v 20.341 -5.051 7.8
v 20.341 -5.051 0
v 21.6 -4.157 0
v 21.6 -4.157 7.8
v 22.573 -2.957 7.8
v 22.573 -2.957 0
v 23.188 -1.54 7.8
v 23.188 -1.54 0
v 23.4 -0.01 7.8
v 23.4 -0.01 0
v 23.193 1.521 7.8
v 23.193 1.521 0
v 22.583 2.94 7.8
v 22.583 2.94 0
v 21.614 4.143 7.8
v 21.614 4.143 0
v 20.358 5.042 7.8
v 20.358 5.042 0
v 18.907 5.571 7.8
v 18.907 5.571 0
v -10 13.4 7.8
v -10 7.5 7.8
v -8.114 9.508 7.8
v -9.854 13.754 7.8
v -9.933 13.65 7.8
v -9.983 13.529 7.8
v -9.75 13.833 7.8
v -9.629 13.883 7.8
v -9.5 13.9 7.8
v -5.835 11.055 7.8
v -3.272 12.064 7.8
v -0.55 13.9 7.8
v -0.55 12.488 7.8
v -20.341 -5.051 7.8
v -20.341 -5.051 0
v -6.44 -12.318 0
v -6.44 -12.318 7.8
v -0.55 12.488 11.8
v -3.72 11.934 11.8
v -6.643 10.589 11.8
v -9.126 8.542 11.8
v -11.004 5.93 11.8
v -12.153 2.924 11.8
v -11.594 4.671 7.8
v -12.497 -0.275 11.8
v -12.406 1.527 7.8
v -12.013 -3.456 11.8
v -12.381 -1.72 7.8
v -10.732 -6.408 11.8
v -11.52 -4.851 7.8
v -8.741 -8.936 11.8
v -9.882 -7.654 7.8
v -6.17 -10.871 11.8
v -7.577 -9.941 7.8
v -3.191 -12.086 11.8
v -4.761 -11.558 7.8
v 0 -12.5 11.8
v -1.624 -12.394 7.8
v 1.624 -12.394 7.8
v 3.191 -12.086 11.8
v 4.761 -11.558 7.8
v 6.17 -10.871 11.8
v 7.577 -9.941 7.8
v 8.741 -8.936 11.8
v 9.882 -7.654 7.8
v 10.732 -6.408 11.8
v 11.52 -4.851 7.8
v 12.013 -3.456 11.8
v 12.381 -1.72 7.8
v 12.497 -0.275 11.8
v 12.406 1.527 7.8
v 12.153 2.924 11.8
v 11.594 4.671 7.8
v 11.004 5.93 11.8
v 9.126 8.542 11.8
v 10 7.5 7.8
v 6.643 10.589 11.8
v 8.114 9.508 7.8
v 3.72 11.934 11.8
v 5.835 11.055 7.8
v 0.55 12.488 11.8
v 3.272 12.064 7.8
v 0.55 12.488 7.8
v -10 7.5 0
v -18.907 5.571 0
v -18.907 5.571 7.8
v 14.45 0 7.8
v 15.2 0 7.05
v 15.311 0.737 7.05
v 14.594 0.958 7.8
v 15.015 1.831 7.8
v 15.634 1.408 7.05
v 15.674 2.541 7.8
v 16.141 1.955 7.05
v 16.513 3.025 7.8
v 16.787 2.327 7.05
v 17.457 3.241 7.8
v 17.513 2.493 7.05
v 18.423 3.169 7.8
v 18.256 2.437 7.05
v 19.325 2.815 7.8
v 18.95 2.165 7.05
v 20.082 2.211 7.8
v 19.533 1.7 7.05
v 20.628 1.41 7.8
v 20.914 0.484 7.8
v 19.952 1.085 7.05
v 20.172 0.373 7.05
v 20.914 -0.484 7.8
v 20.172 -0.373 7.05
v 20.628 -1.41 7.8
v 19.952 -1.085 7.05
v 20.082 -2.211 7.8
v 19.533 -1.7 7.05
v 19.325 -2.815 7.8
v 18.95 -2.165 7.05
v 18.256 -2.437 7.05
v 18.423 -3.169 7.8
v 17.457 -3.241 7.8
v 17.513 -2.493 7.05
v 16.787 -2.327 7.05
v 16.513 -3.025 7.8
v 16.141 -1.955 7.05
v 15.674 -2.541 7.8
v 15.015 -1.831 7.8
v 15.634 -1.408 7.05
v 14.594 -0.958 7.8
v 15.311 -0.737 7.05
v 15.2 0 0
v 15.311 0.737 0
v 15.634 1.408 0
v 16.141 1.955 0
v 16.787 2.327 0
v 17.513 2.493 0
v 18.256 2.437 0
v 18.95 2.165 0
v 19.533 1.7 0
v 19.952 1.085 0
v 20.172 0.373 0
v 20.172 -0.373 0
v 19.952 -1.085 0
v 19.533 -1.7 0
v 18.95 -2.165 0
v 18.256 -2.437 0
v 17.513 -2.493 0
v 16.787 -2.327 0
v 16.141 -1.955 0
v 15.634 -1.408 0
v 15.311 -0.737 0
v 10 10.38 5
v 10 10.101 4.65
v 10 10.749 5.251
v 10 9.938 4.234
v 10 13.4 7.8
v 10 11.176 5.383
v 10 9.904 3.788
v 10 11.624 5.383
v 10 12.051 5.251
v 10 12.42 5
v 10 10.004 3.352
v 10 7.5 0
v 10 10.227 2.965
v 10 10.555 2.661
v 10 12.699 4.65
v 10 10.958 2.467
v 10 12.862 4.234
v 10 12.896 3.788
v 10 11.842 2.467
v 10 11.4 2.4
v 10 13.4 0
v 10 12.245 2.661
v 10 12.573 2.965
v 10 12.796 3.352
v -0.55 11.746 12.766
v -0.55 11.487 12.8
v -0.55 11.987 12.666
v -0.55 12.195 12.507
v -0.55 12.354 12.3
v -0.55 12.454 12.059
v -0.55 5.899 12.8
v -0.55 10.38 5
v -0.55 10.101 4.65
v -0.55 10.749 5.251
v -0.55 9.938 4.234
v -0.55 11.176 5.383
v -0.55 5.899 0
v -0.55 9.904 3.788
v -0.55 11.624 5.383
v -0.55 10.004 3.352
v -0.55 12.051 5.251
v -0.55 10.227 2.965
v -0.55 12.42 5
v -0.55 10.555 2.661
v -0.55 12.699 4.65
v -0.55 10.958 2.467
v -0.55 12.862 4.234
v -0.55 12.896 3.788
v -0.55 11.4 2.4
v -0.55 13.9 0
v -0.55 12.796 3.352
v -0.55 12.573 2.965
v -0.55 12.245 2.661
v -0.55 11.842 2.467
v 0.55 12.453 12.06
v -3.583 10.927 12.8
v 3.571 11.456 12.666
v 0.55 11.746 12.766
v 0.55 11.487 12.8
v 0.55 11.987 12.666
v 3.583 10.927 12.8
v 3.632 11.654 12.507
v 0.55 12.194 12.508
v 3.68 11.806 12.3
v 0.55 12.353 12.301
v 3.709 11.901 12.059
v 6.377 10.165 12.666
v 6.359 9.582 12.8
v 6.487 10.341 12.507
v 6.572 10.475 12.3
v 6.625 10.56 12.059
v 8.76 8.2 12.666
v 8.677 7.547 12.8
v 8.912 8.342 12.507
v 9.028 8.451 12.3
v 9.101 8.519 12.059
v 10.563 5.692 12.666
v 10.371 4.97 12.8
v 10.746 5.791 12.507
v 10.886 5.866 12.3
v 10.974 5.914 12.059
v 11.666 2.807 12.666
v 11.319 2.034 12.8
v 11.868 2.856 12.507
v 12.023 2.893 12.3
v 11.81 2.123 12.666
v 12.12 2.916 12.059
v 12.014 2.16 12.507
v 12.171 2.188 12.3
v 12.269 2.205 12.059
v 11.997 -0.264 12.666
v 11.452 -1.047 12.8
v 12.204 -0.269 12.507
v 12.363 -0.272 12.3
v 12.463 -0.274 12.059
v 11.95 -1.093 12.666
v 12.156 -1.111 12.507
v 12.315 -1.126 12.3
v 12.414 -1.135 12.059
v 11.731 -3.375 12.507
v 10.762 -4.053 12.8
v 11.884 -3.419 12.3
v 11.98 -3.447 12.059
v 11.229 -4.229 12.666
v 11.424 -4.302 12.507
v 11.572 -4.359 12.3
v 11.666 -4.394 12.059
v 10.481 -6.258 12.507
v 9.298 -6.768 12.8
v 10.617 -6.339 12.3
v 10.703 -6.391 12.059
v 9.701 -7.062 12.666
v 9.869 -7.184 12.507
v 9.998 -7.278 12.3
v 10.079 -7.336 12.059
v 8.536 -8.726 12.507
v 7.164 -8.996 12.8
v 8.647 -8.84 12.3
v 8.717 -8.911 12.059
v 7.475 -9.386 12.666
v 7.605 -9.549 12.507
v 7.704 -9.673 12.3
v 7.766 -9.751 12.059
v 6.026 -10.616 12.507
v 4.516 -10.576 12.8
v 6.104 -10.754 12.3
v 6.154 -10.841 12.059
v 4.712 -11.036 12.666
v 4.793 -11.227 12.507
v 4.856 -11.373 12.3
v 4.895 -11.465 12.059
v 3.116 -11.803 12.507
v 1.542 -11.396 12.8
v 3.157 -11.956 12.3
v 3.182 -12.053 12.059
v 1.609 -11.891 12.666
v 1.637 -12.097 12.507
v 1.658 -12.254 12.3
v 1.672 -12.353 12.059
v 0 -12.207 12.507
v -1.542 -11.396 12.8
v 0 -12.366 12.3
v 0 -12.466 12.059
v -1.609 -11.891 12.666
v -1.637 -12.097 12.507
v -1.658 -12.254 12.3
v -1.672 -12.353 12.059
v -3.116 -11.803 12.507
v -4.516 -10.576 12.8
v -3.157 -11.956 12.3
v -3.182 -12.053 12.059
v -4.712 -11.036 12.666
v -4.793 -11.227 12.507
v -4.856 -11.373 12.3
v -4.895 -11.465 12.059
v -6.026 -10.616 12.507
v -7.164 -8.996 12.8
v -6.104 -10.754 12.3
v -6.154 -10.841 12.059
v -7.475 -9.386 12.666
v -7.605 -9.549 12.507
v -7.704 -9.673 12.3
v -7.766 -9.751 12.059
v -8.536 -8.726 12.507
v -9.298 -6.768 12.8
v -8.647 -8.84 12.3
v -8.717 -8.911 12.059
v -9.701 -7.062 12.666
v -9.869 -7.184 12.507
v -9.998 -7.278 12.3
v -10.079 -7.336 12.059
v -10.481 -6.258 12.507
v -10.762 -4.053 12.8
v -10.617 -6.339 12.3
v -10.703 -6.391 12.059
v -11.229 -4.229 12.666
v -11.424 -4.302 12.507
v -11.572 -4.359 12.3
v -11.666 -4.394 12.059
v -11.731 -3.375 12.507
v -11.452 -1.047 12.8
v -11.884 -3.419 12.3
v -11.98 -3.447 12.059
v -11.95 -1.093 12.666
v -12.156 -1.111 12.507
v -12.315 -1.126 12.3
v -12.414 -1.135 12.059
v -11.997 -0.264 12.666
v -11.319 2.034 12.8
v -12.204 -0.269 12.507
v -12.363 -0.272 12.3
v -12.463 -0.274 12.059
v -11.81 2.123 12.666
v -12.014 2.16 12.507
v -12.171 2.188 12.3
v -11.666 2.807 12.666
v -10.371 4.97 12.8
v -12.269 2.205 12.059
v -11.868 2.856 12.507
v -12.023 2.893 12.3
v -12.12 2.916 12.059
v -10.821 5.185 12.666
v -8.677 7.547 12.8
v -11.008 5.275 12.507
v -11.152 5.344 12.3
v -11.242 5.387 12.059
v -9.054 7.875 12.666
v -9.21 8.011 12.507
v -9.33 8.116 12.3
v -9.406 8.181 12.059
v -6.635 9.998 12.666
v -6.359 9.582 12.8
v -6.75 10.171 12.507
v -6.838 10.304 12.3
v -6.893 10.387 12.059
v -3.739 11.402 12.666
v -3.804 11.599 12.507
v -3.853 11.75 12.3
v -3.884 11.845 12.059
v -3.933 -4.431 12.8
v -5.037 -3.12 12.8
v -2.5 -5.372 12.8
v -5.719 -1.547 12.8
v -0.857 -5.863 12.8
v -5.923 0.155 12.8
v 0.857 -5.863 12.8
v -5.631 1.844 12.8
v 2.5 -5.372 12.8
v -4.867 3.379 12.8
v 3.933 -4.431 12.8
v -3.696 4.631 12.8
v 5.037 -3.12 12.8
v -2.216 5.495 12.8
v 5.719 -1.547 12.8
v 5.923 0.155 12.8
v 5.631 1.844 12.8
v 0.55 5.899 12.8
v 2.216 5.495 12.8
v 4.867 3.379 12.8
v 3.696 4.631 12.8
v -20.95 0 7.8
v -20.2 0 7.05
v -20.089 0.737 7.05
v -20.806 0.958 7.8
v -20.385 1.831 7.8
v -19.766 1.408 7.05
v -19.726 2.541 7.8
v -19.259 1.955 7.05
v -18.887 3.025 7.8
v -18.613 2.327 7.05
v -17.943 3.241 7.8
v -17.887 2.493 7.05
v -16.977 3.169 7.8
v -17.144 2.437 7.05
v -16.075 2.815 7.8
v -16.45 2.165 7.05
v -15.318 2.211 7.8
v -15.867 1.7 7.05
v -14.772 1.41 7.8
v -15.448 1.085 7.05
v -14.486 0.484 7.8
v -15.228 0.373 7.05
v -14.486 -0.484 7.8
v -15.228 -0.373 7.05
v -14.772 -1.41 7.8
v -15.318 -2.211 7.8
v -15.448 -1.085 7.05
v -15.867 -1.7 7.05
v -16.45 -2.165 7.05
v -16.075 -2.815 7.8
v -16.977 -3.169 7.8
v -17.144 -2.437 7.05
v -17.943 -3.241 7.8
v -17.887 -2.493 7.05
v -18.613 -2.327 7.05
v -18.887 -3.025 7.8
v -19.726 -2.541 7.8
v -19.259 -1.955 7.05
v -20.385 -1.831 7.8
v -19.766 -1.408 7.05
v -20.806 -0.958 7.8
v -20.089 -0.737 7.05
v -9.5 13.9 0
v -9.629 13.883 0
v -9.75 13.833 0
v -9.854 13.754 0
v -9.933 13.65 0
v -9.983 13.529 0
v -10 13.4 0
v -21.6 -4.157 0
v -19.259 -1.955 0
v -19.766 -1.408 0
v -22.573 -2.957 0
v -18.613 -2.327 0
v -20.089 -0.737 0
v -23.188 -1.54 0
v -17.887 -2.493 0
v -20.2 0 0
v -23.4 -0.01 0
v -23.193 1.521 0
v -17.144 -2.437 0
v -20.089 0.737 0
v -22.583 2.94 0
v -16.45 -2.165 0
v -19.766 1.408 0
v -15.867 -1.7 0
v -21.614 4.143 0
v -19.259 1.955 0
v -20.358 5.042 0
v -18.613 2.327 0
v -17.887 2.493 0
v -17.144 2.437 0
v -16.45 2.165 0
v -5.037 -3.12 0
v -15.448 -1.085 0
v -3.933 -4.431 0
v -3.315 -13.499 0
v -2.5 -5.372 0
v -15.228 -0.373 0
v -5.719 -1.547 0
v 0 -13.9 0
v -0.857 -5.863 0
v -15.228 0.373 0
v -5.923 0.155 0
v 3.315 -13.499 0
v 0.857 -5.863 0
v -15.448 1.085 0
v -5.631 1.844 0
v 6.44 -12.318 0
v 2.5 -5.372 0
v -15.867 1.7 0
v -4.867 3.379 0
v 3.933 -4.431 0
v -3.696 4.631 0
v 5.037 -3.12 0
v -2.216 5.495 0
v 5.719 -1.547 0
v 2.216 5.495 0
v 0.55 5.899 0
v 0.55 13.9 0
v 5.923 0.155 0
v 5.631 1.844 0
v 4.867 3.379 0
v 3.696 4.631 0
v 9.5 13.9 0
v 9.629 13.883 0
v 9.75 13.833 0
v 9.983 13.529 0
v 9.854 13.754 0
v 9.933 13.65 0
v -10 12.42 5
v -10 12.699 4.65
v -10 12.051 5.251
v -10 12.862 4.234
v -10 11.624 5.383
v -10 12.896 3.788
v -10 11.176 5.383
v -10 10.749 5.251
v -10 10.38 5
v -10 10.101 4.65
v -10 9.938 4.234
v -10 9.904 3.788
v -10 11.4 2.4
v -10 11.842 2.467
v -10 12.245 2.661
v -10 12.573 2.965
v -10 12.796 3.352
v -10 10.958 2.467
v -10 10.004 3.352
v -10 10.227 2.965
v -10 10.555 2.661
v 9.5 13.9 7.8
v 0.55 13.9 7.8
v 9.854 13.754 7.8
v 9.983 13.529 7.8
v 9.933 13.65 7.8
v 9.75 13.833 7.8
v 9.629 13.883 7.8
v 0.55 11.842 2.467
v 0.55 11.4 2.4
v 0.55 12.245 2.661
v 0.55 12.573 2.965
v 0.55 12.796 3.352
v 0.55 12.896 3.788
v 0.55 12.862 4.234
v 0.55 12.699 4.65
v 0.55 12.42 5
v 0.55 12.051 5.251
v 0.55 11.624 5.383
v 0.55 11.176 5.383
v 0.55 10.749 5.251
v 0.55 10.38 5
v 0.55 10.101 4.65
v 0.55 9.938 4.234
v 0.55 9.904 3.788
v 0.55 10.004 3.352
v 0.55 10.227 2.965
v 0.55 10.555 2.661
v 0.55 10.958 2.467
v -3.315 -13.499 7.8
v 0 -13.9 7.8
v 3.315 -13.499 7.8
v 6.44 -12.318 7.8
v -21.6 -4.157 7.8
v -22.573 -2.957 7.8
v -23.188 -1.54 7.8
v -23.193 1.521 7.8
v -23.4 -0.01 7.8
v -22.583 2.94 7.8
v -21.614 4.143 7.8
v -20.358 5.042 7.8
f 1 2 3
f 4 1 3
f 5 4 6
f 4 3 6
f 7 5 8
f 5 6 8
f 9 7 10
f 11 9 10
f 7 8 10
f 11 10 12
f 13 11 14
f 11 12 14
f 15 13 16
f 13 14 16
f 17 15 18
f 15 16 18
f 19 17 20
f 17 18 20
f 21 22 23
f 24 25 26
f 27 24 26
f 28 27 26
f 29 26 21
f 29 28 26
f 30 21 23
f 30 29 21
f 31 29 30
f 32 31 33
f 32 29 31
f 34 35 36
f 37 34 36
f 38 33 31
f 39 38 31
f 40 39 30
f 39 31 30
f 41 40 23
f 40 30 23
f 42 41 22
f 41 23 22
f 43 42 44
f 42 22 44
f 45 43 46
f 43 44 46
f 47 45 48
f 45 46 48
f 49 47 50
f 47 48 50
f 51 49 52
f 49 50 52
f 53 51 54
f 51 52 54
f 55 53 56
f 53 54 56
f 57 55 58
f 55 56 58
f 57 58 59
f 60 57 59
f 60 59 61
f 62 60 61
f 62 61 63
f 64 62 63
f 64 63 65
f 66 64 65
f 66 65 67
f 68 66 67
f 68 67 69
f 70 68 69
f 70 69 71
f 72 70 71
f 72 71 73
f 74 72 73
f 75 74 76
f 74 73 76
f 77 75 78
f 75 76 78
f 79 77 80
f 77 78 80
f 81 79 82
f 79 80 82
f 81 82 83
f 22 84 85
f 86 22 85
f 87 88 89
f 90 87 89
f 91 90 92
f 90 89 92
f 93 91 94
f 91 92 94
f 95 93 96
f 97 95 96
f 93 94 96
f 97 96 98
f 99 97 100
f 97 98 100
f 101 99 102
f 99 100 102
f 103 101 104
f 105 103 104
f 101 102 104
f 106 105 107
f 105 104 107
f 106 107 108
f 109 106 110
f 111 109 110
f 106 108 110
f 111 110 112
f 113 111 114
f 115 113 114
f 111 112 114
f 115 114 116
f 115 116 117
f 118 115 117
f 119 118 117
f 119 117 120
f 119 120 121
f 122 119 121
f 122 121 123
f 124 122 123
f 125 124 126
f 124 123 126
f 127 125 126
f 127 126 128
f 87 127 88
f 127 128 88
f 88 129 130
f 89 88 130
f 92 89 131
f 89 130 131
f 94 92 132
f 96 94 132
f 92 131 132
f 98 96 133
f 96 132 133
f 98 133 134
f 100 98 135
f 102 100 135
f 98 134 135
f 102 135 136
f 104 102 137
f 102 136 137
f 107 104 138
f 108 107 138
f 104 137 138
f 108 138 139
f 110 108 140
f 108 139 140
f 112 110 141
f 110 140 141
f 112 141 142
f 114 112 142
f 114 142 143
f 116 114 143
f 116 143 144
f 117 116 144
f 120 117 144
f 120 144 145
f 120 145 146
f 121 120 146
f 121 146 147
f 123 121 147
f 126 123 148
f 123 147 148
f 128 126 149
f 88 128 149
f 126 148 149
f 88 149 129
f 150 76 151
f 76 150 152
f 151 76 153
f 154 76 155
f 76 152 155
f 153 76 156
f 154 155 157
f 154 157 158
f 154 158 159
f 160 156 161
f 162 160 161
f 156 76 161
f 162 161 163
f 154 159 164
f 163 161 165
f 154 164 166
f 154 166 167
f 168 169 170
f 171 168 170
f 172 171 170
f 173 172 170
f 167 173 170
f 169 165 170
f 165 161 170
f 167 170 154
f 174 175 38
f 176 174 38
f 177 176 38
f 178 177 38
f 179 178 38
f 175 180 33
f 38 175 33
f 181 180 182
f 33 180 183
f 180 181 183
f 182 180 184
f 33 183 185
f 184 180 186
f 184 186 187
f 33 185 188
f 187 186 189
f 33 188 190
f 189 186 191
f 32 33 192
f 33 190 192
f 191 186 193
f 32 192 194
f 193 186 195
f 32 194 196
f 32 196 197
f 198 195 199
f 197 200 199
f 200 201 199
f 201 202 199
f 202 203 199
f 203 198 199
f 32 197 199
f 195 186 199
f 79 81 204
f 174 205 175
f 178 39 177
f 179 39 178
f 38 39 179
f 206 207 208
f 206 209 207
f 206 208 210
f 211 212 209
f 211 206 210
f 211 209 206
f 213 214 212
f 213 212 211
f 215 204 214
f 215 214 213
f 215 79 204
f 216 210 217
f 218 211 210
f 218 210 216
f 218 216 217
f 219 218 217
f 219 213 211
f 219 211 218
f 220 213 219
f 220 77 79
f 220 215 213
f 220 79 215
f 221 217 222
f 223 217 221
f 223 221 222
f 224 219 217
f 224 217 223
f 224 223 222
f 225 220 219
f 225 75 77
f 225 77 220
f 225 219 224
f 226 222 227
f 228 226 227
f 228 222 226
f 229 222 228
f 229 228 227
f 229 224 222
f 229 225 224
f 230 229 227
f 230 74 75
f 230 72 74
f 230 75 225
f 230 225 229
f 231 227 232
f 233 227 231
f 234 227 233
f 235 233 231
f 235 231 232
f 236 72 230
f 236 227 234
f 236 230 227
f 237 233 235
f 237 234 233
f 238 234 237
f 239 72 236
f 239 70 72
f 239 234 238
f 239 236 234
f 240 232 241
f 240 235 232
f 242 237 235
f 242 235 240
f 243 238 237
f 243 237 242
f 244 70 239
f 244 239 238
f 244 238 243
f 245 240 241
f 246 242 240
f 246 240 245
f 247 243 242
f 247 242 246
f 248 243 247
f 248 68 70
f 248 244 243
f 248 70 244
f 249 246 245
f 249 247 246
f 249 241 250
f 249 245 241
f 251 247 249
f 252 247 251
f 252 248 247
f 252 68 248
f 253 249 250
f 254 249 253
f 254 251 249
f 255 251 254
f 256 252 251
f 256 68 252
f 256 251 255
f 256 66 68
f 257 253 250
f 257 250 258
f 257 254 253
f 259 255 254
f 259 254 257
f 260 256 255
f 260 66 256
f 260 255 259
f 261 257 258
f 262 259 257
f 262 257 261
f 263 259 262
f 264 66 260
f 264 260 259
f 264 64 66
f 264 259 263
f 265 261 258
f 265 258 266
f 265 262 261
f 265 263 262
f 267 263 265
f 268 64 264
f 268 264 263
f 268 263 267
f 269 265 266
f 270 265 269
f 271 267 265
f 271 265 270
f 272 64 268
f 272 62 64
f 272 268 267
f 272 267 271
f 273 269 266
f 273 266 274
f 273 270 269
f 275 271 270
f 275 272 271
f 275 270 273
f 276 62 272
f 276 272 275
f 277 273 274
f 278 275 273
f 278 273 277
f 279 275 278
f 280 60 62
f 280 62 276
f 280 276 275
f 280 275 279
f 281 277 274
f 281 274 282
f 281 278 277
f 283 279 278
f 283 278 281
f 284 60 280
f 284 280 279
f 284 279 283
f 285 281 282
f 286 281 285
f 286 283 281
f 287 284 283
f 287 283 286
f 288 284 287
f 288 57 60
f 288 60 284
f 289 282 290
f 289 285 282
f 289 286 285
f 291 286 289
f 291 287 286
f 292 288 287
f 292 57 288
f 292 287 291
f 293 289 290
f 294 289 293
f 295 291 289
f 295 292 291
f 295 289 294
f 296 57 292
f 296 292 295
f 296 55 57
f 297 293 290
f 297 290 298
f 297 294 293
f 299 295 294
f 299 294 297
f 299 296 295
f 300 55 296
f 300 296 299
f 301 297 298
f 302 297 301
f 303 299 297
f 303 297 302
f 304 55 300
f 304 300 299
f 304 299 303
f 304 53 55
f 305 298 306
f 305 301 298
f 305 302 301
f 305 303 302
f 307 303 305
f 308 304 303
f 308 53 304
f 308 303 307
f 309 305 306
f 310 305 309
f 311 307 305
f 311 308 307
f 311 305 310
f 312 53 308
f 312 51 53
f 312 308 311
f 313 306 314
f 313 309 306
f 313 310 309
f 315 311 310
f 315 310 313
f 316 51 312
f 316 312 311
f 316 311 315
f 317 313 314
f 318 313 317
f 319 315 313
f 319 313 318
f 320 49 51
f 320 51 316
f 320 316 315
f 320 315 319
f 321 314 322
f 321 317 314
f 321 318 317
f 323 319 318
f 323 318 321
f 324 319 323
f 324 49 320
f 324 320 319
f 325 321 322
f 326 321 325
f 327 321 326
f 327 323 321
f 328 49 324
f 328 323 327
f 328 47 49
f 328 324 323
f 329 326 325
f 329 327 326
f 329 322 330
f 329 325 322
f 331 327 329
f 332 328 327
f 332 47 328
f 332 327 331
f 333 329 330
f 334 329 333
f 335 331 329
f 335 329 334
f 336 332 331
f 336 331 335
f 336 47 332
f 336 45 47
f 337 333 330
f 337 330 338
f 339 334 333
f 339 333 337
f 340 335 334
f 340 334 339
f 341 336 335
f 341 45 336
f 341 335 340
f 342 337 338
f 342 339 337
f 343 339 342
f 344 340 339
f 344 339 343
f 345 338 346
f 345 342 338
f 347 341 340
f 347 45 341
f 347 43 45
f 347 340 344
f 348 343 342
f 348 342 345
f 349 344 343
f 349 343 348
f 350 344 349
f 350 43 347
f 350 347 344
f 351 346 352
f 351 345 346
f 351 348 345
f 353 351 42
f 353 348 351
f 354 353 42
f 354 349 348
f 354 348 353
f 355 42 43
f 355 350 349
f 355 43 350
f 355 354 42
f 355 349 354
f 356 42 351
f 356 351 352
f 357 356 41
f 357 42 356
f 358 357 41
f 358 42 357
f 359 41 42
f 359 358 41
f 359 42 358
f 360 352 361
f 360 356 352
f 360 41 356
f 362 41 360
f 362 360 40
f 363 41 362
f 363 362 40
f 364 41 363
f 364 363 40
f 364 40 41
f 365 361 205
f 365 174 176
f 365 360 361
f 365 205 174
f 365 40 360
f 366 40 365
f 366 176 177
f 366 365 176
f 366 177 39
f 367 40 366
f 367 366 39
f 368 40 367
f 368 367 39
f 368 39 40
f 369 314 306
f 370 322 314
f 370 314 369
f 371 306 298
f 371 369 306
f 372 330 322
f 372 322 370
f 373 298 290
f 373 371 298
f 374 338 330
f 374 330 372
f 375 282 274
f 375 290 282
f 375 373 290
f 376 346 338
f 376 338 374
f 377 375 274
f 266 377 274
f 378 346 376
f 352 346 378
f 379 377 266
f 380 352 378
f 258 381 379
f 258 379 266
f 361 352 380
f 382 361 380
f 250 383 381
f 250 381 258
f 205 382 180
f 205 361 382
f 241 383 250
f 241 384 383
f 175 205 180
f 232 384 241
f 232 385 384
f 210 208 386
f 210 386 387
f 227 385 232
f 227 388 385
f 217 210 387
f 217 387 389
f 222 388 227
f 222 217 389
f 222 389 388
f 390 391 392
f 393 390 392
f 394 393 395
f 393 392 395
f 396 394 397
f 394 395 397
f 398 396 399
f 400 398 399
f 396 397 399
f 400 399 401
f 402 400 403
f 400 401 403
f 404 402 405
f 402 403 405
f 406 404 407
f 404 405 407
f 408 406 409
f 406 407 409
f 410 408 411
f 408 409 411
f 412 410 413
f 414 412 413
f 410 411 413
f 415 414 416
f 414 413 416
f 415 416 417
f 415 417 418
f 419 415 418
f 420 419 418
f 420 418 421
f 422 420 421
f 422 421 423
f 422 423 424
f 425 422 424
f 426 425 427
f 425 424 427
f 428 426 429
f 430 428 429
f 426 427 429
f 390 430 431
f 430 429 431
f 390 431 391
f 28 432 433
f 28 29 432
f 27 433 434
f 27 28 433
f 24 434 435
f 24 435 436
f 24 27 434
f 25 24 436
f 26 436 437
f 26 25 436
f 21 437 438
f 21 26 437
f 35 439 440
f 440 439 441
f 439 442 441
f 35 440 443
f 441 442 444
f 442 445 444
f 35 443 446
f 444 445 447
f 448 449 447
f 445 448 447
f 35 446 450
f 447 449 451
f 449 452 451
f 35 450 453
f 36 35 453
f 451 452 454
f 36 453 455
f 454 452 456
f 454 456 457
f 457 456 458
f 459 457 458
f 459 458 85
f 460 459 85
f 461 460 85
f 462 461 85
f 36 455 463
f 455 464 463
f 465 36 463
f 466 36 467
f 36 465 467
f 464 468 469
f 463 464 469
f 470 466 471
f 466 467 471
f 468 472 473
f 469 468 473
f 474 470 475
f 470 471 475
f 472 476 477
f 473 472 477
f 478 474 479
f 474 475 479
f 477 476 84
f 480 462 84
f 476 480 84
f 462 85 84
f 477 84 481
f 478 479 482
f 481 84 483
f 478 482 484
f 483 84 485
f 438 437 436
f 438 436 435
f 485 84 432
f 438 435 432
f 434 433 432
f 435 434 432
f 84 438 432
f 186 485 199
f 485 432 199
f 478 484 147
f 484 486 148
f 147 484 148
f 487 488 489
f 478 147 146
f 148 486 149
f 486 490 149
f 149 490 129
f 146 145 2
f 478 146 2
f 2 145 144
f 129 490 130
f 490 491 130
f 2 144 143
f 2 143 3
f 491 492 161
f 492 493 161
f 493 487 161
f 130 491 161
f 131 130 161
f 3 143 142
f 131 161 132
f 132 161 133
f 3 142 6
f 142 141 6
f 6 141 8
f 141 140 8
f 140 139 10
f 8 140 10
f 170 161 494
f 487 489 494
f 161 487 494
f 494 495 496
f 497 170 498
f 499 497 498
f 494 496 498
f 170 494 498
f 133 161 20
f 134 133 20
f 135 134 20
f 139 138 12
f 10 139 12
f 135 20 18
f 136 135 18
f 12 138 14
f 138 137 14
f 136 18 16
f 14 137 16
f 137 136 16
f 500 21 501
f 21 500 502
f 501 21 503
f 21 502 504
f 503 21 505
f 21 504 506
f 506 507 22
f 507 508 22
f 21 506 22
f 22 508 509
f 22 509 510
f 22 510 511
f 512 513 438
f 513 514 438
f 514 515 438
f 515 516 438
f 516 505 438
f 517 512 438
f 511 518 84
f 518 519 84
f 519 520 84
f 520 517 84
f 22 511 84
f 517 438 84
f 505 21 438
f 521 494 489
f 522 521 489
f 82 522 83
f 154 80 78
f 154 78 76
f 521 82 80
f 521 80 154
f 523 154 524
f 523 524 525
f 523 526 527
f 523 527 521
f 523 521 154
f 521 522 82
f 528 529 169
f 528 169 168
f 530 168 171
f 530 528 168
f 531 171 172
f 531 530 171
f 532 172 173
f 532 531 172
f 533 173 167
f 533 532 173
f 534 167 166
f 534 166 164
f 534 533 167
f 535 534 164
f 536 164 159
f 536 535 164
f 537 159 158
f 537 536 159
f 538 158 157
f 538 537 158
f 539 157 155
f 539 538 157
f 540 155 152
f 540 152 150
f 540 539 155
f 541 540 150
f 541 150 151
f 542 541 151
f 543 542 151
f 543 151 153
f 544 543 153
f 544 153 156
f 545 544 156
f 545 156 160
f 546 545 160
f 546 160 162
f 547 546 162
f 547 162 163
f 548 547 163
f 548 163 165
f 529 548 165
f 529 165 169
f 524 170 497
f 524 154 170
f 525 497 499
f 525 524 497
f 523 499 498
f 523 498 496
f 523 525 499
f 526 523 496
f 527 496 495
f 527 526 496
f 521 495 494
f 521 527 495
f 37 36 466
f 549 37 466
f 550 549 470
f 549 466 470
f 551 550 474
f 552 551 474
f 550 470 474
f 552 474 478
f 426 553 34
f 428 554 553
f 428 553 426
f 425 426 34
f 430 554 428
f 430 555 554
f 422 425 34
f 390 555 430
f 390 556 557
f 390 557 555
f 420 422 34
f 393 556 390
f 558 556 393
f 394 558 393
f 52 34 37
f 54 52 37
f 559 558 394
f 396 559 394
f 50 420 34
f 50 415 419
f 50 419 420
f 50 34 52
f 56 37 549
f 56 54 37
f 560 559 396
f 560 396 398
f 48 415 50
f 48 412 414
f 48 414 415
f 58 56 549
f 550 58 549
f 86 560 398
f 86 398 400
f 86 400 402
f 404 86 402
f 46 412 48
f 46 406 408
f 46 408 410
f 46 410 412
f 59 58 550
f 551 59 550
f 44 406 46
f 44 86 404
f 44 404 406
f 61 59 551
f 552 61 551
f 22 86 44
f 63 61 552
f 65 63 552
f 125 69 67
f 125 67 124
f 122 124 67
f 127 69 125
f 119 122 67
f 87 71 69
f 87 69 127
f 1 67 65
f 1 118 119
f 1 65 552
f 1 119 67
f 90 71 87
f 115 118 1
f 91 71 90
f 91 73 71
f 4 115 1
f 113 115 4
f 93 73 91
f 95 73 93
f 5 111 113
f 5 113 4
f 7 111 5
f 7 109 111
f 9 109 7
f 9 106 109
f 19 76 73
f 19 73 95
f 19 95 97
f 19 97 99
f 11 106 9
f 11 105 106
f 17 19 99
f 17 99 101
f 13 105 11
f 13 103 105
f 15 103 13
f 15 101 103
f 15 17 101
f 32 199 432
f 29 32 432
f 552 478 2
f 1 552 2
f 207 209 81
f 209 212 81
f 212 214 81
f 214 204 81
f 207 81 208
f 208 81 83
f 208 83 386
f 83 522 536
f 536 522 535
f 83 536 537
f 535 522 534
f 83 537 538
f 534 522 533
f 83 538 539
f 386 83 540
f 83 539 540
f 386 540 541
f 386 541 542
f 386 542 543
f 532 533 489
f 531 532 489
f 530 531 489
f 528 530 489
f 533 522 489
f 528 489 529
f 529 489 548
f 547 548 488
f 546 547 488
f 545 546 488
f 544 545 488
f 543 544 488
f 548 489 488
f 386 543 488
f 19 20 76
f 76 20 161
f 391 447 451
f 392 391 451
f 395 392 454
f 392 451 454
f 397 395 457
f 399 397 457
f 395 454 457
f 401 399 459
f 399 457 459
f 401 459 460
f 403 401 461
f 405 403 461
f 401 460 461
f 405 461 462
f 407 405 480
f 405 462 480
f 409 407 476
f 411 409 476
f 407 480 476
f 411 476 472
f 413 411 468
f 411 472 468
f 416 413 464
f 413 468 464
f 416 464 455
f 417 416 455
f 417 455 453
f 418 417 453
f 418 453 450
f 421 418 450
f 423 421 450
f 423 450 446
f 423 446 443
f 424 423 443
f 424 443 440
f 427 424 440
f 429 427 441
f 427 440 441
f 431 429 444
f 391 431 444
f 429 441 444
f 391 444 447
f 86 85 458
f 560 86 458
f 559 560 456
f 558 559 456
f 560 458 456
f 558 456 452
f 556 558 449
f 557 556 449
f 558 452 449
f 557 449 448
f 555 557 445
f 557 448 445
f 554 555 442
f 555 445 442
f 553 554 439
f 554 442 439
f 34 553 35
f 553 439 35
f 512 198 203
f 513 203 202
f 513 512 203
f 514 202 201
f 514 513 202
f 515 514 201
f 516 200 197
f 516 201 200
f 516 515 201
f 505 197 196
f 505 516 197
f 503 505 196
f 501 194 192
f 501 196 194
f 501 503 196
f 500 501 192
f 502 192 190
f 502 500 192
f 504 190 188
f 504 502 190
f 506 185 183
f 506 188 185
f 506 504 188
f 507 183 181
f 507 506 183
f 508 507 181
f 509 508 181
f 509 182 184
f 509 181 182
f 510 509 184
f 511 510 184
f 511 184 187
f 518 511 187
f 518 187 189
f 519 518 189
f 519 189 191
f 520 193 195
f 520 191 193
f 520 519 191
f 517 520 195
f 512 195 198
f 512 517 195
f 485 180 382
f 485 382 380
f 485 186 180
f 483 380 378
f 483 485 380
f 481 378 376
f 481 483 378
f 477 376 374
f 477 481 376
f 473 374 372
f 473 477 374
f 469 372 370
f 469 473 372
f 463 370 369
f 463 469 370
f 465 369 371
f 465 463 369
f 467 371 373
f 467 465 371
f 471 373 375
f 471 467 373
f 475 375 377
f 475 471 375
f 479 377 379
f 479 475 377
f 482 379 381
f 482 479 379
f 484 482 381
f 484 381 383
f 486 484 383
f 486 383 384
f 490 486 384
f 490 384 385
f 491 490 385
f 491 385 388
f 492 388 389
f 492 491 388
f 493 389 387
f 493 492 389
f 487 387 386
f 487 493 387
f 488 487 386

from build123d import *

# Parameters (mm, degrees)
CROQUIS1_R              = 12.5
CROQUIS1_R_2            = 5.925
SALIENTE_EXTRUIR1_DEPTH = 12.8
CROQUIS2_R              = 5.925
SALIENTE_EXTRUIR2_DEPTH = 7.8
CROQUIS3_R              = 2.5
CORTAR_EXTRUIR1_DEPTH   = 7.8
CORTAR_EXTRUIR2_DEPTH   = 13
REDONDEO1_R             = 1
CORTAR_EXTRUIR3_START   = -20
CROQUIS5_R              = 1.5
CORTAR_EXTRUIR3_DEPTH   = 20
REDONDEO2_R             = 0.5
CHAFL_N1_SIZE           = 0.75


with BuildPart() as part:
    # Croquis1 → Saliente-Extruir1 (new body)
    with BuildSketch(Plane.XY):
        Circle(CROQUIS1_R)
        Circle(CROQUIS1_R_2, mode=Mode.SUBTRACT)
    extrude(amount=SALIENTE_EXTRUIR1_DEPTH)

    # Croquis2 → Saliente-Extruir2 (add)
    with BuildSketch(Plane(origin=(0, 0, 0), x_dir=(-1, 0, 0), z_dir=(0, 0, -1))):
        with BuildLine():
            Line((-6.439548023, -12.318369262), (-20.340677966, -5.051417611))
            ThreePointArc((-20.340677966, -5.051417611), (-23.348755649, 0.76260056), (-18.906641236, 5.570818336))
            Line((-18.906641236, 5.570818336), (-10, 7.5))
            Line((-10, 7.5), (-10, 13.9))
            Line((-10, 13.9), (10, 13.9))
            Line((10, 13.9), (10, 7.5))
            Line((10, 7.5), (18.906641236, 5.570818336))
            ThreePointArc((18.906641236, 5.570818336), (23.348755649, 0.76260056), (20.340677966, -5.051417611))
            Line((20.340677966, -5.051417611), (6.439548023, -12.318369262))
            ThreePointArc((6.439548023, -12.318369262), (0, -13.9), (-6.439548023, -12.318369262))
        make_face()
        Circle(CROQUIS2_R, mode=Mode.SUBTRACT)
    extrude(amount=-SALIENTE_EXTRUIR2_DEPTH)

    # Croquis3 → Cortar-Extruir1 (cut)
    with BuildSketch(Plane(origin=(0, 0, 0), x_dir=(-1, 0, 0), z_dir=(0, 0, -1))):
        with Locations((-17.7, 0)):
            Circle(CROQUIS3_R)
        with Locations((17.7, 0)):
            Circle(CROQUIS3_R)
    extrude(amount=-CORTAR_EXTRUIR1_DEPTH, mode=Mode.SUBTRACT)

    # Croquis4 → Cortar-Extruir2 (cut)
    with BuildSketch(Plane(origin=(0, 0, 0), x_dir=(-1, 0, 0), z_dir=(0, 0, -1))):
        with BuildLine():
            Line((0.55, 13.9), (-0.55, 13.9))
            Line((-0.55, 13.9), (-0.55, 5.899417344))
            ThreePointArc((-0.55, 5.899417344), (0, 5.925), (0.55, 5.899417344))
            Line((0.55, 5.899417344), (0.55, 13.9))
        make_face()
    extrude(amount=-CORTAR_EXTRUIR2_DEPTH, mode=Mode.SUBTRACT)

    # Redondeo1
    redondeo1_edges = [part.edges().sort_by_distance(p)[0] for p in [
        (0, -12.5, 12.8),
    ]]
    fillet(redondeo1_edges, radius=REDONDEO1_R)

    # Croquis5 → Cortar-Extruir3 (cut)
    with BuildSketch(Plane(origin=(10, 0, 0), x_dir=(0, 0, -1), z_dir=(1, 0, 0)).offset(CORTAR_EXTRUIR3_START)):
        with Locations((-3.9, 11.4)):
            Circle(CROQUIS5_R)
    extrude(amount=CORTAR_EXTRUIR3_DEPTH, mode=Mode.SUBTRACT)

    # Redondeo2
    redondeo2_edges = [part.edges().sort_by_distance(p)[0] for p in [
        (10, 13.9, 3.9),
        (-10, 13.9, 3.9),
    ]]
    fillet(redondeo2_edges, radius=REDONDEO2_R)

    # Chaflán1
    chafl_n1_edges = [part.edges().sort_by_distance(p)[0] for p in [
        (20.2, 0, 7.8),
        (-15.2, 0, 7.8),
    ]]
    chamfer(chafl_n1_edges, length=CHAFL_N1_SIZE)


solid = part.part
